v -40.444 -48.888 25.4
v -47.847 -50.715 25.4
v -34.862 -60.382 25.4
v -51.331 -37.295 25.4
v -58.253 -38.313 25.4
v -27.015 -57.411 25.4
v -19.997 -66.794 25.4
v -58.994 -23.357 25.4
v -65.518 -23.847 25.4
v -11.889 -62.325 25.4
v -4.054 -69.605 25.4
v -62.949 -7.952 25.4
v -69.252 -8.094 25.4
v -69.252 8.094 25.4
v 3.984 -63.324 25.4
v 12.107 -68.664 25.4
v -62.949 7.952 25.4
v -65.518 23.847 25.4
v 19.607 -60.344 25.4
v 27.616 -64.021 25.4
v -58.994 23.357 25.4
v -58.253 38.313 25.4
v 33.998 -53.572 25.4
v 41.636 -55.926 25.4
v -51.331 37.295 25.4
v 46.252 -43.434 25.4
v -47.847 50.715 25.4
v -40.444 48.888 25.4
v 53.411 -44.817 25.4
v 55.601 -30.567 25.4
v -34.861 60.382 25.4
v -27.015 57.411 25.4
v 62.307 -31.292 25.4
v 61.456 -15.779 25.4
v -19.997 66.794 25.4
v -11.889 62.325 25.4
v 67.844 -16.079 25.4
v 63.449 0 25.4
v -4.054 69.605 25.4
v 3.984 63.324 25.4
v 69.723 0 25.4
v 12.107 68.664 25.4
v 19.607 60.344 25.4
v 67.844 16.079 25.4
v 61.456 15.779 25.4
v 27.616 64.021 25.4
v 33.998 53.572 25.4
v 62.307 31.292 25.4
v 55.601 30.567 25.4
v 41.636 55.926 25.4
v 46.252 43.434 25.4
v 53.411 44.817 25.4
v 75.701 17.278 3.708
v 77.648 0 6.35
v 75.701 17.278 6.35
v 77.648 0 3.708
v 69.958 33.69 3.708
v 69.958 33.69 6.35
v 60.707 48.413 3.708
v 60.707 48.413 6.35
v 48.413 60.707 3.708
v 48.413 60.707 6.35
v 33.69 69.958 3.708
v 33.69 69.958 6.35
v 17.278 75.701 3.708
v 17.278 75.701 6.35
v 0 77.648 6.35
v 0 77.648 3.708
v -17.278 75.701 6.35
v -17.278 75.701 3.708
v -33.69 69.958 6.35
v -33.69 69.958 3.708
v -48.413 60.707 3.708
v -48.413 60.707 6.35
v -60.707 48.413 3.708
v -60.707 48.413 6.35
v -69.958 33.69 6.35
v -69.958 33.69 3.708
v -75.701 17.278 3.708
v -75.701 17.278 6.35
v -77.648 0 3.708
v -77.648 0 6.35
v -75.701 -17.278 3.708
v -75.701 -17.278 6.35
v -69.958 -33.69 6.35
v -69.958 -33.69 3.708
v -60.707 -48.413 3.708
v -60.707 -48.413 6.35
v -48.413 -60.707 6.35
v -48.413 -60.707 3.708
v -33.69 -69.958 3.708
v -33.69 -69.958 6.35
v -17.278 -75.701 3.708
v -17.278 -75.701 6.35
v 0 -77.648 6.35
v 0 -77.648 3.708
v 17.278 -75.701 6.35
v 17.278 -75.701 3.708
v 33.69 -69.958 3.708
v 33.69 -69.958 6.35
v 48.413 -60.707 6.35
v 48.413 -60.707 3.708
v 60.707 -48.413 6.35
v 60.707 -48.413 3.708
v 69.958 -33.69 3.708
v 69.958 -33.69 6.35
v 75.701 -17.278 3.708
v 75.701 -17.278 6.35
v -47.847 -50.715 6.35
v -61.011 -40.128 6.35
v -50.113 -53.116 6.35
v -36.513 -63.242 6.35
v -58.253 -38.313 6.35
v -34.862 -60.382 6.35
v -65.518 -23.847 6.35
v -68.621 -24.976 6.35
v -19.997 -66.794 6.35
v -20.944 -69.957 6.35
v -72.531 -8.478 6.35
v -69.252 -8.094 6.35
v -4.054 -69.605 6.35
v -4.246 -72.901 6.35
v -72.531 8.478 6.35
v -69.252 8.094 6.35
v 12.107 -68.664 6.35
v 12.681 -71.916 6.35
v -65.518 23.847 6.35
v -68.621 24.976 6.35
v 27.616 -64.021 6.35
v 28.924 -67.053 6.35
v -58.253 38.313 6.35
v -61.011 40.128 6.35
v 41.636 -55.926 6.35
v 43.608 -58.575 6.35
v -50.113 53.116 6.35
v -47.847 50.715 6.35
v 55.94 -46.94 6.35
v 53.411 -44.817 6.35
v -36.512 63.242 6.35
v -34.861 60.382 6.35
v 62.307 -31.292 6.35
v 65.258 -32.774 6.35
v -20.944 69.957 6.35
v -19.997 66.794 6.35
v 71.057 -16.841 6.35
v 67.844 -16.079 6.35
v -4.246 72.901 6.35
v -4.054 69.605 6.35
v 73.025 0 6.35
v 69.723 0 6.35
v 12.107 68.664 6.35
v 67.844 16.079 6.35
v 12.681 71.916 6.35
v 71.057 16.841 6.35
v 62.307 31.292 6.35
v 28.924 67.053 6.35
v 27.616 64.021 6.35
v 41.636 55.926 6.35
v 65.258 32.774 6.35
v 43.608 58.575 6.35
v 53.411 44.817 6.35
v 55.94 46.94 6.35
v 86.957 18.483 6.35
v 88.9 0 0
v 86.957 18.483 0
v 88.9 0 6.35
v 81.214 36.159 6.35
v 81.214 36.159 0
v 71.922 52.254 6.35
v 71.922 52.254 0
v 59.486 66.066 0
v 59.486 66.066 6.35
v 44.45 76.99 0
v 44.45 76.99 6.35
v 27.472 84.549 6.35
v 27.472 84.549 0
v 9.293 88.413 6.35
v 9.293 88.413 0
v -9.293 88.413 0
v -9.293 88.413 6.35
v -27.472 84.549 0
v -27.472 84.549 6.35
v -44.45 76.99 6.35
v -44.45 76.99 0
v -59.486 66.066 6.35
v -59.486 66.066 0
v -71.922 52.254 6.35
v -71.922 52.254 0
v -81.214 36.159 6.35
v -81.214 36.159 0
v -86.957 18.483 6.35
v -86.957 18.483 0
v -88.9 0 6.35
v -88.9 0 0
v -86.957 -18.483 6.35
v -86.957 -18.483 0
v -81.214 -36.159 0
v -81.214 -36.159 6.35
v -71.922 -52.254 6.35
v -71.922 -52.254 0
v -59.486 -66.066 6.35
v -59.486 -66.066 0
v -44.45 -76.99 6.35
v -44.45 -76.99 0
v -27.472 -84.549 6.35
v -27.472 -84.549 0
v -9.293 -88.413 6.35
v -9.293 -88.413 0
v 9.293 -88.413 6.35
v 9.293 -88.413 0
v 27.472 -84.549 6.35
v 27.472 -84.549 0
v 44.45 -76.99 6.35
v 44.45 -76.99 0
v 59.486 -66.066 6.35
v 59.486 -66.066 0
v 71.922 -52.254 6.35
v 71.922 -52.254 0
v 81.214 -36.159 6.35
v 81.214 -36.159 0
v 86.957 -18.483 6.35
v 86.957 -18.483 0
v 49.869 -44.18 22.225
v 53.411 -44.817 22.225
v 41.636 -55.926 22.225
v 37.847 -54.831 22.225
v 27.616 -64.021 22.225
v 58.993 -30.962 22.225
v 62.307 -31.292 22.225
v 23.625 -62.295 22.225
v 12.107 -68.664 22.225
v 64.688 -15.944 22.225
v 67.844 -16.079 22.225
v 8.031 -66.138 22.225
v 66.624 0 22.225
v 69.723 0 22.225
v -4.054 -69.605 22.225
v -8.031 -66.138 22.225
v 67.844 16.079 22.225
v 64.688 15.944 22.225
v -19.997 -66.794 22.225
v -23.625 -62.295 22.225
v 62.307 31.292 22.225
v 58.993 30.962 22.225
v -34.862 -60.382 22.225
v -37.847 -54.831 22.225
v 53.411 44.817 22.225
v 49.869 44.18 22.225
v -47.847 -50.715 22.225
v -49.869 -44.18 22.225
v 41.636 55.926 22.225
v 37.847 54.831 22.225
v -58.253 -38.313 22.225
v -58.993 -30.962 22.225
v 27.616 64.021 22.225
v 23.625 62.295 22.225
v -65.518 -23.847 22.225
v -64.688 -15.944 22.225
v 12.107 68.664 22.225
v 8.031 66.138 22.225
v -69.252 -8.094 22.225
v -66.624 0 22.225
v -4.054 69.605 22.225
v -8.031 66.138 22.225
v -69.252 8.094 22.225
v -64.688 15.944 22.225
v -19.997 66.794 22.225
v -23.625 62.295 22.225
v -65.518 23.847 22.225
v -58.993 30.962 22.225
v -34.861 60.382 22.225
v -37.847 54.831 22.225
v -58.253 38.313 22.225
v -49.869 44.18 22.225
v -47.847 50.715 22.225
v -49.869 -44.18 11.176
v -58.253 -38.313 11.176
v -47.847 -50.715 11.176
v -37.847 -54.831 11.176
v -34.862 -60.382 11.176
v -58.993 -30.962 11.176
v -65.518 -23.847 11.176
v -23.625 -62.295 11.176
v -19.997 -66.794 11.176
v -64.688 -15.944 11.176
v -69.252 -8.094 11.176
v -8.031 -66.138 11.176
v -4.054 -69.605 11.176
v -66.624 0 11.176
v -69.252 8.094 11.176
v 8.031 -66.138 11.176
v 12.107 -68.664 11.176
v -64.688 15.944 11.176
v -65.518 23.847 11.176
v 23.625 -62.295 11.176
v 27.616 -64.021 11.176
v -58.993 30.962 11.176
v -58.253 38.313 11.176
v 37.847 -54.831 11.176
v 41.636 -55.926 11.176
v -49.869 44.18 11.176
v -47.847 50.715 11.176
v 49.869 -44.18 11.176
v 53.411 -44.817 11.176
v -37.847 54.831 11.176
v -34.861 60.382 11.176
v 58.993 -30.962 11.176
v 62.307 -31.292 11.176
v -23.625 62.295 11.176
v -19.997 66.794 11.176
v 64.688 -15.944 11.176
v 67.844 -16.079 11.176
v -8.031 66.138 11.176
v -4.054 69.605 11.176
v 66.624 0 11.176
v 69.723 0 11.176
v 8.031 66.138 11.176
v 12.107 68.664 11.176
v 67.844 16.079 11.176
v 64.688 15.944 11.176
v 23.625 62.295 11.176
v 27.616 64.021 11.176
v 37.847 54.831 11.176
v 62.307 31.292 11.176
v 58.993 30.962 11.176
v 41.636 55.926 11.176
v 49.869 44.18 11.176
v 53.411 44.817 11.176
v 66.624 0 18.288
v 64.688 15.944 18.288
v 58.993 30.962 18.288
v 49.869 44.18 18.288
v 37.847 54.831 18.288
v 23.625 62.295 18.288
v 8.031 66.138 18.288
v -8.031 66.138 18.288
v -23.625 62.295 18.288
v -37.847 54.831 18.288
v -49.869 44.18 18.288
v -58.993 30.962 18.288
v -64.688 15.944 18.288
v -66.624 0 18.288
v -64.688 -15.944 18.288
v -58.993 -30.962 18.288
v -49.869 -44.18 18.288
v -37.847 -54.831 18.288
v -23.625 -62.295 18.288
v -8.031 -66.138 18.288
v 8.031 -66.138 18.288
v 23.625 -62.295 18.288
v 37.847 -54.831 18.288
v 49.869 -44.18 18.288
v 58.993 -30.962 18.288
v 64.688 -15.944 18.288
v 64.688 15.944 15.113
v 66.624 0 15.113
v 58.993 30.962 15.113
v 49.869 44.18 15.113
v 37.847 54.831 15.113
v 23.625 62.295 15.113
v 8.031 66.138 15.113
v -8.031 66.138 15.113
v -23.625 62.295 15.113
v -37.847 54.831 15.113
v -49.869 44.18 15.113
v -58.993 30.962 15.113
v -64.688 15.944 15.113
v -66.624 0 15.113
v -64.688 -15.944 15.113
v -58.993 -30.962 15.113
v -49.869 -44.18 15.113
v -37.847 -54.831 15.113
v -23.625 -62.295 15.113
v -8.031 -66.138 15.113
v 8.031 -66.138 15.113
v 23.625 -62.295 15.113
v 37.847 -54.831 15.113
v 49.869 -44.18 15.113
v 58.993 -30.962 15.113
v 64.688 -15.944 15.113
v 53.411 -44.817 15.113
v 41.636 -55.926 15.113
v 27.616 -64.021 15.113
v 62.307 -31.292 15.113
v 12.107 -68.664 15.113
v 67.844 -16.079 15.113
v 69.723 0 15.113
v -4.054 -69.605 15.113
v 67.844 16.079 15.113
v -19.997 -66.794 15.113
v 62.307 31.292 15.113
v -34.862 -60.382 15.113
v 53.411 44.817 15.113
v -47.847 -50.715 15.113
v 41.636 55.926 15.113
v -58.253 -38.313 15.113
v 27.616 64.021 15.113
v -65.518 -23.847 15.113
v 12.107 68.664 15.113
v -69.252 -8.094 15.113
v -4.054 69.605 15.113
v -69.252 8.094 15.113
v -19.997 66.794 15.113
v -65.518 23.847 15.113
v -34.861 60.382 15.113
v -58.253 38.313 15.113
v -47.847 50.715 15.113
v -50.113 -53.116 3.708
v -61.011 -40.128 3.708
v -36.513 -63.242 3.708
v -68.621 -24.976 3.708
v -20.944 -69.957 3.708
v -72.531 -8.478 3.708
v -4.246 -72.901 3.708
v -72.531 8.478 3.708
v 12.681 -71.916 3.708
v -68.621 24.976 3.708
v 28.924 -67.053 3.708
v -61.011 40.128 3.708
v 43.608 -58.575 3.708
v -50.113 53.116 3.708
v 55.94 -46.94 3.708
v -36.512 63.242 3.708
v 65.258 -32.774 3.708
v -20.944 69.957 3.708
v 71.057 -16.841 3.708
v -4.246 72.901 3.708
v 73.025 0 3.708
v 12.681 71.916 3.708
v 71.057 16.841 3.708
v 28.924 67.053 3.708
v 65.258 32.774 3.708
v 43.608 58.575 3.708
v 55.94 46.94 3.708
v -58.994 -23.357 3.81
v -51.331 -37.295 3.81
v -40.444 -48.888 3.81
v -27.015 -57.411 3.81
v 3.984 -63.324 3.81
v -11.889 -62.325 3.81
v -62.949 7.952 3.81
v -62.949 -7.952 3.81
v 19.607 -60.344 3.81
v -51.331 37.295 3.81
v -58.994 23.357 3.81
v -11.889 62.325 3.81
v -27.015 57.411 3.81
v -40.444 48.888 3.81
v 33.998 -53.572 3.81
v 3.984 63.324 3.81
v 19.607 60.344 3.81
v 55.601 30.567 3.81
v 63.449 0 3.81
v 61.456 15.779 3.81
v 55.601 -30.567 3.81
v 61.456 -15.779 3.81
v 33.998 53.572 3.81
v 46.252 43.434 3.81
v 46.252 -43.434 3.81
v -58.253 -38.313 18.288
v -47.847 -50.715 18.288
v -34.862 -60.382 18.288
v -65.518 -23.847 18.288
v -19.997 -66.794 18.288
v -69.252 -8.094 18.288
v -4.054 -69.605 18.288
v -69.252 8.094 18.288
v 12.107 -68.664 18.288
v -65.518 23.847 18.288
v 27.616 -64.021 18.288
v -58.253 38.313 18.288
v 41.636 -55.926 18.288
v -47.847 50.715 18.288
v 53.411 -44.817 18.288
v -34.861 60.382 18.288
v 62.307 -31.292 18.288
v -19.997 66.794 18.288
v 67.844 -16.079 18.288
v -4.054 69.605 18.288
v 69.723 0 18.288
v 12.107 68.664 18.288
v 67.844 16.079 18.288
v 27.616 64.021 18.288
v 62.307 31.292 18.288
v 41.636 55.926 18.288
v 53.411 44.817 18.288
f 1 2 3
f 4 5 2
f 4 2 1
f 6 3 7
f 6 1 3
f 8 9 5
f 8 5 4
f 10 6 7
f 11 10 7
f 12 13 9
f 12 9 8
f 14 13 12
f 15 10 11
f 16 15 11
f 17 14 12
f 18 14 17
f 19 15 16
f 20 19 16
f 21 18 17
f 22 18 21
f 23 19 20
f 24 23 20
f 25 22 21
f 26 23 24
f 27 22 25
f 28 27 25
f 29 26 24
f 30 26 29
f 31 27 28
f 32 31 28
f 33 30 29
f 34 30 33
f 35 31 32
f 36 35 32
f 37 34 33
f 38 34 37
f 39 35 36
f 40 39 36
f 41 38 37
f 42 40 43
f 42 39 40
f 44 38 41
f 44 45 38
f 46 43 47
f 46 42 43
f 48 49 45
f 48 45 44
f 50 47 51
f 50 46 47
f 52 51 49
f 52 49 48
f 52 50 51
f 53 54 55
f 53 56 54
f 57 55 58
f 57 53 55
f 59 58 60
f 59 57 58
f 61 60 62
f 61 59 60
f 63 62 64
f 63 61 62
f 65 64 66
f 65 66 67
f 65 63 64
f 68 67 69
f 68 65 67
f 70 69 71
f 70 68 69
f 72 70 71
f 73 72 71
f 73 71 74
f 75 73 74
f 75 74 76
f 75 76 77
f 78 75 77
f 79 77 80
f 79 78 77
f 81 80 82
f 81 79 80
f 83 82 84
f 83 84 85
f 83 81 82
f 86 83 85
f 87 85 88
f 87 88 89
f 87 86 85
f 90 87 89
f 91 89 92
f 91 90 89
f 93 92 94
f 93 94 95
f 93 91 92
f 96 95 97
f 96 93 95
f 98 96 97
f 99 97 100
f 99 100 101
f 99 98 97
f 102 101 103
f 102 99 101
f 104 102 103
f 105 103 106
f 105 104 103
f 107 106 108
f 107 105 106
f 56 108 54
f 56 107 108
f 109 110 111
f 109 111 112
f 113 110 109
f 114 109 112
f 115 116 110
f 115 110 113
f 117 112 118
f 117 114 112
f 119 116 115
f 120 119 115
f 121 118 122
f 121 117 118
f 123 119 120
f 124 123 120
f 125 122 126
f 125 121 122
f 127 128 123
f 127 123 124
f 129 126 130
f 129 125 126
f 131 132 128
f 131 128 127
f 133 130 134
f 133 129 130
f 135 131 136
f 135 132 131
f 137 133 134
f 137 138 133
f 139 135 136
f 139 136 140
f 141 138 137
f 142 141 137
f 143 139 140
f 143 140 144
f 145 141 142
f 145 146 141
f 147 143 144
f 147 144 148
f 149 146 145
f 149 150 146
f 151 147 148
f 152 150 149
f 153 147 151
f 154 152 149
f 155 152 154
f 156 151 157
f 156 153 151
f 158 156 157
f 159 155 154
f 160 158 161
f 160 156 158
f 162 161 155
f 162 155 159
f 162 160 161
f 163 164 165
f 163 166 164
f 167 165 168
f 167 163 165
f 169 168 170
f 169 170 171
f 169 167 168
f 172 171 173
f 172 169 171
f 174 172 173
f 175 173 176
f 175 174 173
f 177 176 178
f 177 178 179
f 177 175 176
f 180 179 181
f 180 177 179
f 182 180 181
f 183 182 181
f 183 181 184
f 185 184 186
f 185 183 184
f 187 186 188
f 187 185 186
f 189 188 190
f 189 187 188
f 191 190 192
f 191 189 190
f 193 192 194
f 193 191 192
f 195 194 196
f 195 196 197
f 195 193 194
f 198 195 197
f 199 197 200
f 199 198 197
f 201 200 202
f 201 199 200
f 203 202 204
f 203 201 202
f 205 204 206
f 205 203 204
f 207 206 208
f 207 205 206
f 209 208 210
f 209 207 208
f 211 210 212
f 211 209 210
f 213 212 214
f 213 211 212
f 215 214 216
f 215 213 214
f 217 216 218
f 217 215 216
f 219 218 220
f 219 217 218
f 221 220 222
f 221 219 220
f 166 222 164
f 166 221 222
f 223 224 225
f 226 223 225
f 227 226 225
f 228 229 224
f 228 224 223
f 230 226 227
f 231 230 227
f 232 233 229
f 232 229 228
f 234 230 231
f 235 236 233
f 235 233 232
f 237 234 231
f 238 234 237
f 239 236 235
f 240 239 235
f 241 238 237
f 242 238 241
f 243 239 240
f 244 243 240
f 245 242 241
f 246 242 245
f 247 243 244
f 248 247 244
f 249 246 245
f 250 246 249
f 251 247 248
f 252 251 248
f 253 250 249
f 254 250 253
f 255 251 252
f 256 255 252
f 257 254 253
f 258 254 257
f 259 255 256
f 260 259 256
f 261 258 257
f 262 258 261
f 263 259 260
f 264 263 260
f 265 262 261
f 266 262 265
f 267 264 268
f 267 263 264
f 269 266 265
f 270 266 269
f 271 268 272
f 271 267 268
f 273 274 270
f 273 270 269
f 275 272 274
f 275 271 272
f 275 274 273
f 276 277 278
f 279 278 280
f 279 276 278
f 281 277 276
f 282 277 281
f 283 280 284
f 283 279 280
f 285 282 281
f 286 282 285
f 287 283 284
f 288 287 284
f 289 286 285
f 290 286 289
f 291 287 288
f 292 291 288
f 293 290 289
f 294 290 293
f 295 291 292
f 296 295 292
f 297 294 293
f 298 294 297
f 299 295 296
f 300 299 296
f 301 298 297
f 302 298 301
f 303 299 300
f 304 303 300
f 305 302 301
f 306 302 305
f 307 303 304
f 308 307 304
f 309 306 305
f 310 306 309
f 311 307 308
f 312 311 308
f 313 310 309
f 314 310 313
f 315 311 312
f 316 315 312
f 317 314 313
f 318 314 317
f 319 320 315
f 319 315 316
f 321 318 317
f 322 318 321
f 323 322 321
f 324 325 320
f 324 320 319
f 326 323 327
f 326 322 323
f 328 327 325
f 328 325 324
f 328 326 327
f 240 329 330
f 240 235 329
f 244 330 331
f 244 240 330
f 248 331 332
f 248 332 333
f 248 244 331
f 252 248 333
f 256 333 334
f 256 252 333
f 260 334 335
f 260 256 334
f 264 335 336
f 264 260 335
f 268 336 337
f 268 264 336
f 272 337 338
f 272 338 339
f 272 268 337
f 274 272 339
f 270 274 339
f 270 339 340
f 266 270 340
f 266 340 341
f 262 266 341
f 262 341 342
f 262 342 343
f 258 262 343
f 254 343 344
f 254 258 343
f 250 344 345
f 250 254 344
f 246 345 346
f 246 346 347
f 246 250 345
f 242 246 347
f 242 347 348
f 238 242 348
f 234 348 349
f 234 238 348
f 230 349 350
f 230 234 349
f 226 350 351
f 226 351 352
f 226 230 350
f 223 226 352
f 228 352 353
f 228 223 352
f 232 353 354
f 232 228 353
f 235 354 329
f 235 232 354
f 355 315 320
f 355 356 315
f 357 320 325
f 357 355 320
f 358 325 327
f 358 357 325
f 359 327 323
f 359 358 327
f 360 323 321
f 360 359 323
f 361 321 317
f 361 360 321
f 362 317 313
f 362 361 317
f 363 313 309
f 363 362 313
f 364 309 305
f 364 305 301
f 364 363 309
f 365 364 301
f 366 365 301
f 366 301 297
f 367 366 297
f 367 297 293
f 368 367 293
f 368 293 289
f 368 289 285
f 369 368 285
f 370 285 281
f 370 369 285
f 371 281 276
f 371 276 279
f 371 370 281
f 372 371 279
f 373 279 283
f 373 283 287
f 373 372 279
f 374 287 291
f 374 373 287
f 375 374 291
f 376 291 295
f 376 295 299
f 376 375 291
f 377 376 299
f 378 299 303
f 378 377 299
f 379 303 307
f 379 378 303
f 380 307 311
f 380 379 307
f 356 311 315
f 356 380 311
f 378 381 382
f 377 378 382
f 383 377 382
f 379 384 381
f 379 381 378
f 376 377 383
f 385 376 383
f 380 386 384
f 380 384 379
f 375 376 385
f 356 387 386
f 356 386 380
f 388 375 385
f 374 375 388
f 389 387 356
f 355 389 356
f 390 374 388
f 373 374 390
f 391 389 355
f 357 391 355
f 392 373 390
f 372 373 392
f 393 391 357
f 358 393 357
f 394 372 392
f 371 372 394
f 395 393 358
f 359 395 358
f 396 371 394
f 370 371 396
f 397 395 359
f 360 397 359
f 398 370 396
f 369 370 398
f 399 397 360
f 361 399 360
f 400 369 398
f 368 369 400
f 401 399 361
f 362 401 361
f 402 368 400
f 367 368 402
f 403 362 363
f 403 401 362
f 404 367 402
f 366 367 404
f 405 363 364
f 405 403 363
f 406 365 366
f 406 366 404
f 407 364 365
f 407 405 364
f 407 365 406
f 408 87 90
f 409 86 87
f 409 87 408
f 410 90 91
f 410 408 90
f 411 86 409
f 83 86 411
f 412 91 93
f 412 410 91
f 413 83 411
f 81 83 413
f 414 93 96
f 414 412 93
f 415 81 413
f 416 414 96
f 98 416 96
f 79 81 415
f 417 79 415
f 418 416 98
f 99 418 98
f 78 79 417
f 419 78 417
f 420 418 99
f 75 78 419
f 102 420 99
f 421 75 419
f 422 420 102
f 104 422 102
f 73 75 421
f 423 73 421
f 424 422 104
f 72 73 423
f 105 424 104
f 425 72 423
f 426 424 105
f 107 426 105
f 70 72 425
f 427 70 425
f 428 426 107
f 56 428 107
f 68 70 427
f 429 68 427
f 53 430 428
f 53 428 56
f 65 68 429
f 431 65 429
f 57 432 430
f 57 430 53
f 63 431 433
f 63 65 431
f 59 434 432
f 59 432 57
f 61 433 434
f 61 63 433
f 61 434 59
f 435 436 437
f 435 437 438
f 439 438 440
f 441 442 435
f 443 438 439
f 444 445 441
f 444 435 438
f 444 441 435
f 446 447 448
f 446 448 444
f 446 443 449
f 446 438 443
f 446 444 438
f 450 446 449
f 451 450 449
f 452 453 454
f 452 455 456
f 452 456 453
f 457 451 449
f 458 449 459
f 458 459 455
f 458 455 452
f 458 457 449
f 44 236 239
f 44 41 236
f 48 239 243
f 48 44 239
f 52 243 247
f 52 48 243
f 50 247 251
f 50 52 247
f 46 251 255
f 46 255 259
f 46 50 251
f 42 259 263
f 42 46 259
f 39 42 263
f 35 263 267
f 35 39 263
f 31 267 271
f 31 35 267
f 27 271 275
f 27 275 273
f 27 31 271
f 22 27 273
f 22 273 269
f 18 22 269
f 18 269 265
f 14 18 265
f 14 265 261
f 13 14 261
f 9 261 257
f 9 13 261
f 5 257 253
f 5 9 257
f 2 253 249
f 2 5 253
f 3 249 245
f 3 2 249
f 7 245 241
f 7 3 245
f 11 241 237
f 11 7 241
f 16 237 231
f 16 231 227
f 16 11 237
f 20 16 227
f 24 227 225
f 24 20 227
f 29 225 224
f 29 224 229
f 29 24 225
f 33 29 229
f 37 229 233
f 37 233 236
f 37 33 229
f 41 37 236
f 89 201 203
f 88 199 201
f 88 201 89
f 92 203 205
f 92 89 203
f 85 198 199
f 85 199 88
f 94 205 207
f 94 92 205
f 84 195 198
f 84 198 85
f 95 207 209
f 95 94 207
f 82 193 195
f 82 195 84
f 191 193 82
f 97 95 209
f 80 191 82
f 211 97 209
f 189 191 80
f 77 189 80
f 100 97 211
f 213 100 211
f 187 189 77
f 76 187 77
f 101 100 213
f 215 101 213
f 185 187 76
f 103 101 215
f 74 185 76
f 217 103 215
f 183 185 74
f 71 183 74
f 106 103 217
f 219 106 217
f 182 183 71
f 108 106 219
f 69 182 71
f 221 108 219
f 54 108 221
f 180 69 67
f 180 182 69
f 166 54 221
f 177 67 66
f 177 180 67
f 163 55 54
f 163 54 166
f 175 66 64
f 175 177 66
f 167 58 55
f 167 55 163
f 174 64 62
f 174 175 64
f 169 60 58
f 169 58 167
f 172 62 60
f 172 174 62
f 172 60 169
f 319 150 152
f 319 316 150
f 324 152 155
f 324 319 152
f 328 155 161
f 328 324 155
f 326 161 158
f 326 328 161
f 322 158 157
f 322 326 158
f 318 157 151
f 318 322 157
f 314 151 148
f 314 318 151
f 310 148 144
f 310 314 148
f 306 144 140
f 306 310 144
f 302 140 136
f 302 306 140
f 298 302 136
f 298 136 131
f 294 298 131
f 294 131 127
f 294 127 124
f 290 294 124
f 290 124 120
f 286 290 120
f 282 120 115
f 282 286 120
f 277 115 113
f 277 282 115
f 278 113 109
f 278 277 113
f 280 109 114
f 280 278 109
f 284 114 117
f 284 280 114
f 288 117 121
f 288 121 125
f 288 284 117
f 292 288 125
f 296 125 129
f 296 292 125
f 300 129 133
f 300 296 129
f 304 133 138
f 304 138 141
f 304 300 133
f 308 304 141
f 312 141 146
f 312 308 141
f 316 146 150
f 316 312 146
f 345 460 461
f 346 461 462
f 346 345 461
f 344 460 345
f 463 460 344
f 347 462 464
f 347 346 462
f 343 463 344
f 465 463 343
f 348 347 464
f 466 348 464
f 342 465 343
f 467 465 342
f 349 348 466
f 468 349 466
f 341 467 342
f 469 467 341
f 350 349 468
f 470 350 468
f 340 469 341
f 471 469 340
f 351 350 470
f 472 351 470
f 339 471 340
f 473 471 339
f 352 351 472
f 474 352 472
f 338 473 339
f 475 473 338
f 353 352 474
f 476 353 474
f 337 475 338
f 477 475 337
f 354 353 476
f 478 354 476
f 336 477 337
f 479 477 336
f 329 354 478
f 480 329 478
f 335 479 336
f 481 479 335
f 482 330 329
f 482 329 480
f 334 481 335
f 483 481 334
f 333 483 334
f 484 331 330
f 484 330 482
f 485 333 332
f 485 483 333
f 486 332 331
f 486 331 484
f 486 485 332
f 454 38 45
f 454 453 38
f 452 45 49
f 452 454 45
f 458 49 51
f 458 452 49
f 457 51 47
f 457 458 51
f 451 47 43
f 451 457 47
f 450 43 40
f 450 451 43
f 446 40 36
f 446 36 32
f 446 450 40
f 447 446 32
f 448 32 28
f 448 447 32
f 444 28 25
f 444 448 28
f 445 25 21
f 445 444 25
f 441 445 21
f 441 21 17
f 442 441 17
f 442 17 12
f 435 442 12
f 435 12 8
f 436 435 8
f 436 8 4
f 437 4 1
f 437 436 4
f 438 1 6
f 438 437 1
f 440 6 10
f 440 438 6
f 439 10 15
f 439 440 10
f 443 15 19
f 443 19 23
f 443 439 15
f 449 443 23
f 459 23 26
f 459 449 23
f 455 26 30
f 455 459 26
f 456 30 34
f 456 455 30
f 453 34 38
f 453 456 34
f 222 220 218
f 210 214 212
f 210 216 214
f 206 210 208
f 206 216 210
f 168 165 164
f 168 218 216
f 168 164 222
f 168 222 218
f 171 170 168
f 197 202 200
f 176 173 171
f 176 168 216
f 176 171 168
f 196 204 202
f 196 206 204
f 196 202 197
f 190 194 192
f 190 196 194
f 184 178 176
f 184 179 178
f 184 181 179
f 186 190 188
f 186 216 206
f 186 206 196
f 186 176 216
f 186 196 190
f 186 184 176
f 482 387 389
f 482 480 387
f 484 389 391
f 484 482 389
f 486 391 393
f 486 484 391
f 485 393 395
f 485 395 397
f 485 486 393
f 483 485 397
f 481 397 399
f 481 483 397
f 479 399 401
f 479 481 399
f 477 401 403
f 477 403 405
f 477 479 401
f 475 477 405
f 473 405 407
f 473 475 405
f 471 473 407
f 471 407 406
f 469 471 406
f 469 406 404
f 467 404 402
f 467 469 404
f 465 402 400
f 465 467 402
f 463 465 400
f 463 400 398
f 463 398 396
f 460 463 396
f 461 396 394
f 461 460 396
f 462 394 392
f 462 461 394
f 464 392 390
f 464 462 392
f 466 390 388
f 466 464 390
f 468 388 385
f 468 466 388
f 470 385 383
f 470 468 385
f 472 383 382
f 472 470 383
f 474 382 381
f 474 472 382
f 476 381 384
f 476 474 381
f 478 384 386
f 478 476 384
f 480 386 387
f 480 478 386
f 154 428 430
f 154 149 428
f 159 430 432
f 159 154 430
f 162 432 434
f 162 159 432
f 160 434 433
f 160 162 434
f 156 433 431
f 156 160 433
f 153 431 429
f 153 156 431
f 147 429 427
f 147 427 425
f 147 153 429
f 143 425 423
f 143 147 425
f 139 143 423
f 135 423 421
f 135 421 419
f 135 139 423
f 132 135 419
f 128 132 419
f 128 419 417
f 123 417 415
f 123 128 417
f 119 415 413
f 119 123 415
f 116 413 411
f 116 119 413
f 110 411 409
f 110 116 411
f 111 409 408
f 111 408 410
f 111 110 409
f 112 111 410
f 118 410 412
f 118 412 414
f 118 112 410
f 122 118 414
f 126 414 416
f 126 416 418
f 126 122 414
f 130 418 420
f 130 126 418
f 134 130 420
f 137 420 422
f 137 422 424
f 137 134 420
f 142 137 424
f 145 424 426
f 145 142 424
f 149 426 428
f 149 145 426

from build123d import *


with BuildPart() as part:
    # Sketch1 → Revolve1 (revolve)
    with BuildSketch(Plane(origin=(0, 0, 0), x_dir=(1, 0, 0), z_dir=(0, 1, 0))):
        Polygon((0, 0), (88.9, 0), (88.9, -6.35), (77.6478, -6.35), (77.6478, -3.7084), (73.025, -3.7084), (73.025, -6.35), (69.723, -6.35), (69.723, -11.176), (66.6242, -11.176), (66.6242, -15.113), (69.723, -15.113), (69.723, -18.288), (66.6242, -18.288), (66.6242, -22.225), (69.723, -22.225), (69.723, -25.4), (63.4492, -25.4), (63.4492, -3.81), (0, -3.81), align=None)
    revolve(axis=Axis((0, 0, 0), (0, 0, 1)))


solid = part.part
